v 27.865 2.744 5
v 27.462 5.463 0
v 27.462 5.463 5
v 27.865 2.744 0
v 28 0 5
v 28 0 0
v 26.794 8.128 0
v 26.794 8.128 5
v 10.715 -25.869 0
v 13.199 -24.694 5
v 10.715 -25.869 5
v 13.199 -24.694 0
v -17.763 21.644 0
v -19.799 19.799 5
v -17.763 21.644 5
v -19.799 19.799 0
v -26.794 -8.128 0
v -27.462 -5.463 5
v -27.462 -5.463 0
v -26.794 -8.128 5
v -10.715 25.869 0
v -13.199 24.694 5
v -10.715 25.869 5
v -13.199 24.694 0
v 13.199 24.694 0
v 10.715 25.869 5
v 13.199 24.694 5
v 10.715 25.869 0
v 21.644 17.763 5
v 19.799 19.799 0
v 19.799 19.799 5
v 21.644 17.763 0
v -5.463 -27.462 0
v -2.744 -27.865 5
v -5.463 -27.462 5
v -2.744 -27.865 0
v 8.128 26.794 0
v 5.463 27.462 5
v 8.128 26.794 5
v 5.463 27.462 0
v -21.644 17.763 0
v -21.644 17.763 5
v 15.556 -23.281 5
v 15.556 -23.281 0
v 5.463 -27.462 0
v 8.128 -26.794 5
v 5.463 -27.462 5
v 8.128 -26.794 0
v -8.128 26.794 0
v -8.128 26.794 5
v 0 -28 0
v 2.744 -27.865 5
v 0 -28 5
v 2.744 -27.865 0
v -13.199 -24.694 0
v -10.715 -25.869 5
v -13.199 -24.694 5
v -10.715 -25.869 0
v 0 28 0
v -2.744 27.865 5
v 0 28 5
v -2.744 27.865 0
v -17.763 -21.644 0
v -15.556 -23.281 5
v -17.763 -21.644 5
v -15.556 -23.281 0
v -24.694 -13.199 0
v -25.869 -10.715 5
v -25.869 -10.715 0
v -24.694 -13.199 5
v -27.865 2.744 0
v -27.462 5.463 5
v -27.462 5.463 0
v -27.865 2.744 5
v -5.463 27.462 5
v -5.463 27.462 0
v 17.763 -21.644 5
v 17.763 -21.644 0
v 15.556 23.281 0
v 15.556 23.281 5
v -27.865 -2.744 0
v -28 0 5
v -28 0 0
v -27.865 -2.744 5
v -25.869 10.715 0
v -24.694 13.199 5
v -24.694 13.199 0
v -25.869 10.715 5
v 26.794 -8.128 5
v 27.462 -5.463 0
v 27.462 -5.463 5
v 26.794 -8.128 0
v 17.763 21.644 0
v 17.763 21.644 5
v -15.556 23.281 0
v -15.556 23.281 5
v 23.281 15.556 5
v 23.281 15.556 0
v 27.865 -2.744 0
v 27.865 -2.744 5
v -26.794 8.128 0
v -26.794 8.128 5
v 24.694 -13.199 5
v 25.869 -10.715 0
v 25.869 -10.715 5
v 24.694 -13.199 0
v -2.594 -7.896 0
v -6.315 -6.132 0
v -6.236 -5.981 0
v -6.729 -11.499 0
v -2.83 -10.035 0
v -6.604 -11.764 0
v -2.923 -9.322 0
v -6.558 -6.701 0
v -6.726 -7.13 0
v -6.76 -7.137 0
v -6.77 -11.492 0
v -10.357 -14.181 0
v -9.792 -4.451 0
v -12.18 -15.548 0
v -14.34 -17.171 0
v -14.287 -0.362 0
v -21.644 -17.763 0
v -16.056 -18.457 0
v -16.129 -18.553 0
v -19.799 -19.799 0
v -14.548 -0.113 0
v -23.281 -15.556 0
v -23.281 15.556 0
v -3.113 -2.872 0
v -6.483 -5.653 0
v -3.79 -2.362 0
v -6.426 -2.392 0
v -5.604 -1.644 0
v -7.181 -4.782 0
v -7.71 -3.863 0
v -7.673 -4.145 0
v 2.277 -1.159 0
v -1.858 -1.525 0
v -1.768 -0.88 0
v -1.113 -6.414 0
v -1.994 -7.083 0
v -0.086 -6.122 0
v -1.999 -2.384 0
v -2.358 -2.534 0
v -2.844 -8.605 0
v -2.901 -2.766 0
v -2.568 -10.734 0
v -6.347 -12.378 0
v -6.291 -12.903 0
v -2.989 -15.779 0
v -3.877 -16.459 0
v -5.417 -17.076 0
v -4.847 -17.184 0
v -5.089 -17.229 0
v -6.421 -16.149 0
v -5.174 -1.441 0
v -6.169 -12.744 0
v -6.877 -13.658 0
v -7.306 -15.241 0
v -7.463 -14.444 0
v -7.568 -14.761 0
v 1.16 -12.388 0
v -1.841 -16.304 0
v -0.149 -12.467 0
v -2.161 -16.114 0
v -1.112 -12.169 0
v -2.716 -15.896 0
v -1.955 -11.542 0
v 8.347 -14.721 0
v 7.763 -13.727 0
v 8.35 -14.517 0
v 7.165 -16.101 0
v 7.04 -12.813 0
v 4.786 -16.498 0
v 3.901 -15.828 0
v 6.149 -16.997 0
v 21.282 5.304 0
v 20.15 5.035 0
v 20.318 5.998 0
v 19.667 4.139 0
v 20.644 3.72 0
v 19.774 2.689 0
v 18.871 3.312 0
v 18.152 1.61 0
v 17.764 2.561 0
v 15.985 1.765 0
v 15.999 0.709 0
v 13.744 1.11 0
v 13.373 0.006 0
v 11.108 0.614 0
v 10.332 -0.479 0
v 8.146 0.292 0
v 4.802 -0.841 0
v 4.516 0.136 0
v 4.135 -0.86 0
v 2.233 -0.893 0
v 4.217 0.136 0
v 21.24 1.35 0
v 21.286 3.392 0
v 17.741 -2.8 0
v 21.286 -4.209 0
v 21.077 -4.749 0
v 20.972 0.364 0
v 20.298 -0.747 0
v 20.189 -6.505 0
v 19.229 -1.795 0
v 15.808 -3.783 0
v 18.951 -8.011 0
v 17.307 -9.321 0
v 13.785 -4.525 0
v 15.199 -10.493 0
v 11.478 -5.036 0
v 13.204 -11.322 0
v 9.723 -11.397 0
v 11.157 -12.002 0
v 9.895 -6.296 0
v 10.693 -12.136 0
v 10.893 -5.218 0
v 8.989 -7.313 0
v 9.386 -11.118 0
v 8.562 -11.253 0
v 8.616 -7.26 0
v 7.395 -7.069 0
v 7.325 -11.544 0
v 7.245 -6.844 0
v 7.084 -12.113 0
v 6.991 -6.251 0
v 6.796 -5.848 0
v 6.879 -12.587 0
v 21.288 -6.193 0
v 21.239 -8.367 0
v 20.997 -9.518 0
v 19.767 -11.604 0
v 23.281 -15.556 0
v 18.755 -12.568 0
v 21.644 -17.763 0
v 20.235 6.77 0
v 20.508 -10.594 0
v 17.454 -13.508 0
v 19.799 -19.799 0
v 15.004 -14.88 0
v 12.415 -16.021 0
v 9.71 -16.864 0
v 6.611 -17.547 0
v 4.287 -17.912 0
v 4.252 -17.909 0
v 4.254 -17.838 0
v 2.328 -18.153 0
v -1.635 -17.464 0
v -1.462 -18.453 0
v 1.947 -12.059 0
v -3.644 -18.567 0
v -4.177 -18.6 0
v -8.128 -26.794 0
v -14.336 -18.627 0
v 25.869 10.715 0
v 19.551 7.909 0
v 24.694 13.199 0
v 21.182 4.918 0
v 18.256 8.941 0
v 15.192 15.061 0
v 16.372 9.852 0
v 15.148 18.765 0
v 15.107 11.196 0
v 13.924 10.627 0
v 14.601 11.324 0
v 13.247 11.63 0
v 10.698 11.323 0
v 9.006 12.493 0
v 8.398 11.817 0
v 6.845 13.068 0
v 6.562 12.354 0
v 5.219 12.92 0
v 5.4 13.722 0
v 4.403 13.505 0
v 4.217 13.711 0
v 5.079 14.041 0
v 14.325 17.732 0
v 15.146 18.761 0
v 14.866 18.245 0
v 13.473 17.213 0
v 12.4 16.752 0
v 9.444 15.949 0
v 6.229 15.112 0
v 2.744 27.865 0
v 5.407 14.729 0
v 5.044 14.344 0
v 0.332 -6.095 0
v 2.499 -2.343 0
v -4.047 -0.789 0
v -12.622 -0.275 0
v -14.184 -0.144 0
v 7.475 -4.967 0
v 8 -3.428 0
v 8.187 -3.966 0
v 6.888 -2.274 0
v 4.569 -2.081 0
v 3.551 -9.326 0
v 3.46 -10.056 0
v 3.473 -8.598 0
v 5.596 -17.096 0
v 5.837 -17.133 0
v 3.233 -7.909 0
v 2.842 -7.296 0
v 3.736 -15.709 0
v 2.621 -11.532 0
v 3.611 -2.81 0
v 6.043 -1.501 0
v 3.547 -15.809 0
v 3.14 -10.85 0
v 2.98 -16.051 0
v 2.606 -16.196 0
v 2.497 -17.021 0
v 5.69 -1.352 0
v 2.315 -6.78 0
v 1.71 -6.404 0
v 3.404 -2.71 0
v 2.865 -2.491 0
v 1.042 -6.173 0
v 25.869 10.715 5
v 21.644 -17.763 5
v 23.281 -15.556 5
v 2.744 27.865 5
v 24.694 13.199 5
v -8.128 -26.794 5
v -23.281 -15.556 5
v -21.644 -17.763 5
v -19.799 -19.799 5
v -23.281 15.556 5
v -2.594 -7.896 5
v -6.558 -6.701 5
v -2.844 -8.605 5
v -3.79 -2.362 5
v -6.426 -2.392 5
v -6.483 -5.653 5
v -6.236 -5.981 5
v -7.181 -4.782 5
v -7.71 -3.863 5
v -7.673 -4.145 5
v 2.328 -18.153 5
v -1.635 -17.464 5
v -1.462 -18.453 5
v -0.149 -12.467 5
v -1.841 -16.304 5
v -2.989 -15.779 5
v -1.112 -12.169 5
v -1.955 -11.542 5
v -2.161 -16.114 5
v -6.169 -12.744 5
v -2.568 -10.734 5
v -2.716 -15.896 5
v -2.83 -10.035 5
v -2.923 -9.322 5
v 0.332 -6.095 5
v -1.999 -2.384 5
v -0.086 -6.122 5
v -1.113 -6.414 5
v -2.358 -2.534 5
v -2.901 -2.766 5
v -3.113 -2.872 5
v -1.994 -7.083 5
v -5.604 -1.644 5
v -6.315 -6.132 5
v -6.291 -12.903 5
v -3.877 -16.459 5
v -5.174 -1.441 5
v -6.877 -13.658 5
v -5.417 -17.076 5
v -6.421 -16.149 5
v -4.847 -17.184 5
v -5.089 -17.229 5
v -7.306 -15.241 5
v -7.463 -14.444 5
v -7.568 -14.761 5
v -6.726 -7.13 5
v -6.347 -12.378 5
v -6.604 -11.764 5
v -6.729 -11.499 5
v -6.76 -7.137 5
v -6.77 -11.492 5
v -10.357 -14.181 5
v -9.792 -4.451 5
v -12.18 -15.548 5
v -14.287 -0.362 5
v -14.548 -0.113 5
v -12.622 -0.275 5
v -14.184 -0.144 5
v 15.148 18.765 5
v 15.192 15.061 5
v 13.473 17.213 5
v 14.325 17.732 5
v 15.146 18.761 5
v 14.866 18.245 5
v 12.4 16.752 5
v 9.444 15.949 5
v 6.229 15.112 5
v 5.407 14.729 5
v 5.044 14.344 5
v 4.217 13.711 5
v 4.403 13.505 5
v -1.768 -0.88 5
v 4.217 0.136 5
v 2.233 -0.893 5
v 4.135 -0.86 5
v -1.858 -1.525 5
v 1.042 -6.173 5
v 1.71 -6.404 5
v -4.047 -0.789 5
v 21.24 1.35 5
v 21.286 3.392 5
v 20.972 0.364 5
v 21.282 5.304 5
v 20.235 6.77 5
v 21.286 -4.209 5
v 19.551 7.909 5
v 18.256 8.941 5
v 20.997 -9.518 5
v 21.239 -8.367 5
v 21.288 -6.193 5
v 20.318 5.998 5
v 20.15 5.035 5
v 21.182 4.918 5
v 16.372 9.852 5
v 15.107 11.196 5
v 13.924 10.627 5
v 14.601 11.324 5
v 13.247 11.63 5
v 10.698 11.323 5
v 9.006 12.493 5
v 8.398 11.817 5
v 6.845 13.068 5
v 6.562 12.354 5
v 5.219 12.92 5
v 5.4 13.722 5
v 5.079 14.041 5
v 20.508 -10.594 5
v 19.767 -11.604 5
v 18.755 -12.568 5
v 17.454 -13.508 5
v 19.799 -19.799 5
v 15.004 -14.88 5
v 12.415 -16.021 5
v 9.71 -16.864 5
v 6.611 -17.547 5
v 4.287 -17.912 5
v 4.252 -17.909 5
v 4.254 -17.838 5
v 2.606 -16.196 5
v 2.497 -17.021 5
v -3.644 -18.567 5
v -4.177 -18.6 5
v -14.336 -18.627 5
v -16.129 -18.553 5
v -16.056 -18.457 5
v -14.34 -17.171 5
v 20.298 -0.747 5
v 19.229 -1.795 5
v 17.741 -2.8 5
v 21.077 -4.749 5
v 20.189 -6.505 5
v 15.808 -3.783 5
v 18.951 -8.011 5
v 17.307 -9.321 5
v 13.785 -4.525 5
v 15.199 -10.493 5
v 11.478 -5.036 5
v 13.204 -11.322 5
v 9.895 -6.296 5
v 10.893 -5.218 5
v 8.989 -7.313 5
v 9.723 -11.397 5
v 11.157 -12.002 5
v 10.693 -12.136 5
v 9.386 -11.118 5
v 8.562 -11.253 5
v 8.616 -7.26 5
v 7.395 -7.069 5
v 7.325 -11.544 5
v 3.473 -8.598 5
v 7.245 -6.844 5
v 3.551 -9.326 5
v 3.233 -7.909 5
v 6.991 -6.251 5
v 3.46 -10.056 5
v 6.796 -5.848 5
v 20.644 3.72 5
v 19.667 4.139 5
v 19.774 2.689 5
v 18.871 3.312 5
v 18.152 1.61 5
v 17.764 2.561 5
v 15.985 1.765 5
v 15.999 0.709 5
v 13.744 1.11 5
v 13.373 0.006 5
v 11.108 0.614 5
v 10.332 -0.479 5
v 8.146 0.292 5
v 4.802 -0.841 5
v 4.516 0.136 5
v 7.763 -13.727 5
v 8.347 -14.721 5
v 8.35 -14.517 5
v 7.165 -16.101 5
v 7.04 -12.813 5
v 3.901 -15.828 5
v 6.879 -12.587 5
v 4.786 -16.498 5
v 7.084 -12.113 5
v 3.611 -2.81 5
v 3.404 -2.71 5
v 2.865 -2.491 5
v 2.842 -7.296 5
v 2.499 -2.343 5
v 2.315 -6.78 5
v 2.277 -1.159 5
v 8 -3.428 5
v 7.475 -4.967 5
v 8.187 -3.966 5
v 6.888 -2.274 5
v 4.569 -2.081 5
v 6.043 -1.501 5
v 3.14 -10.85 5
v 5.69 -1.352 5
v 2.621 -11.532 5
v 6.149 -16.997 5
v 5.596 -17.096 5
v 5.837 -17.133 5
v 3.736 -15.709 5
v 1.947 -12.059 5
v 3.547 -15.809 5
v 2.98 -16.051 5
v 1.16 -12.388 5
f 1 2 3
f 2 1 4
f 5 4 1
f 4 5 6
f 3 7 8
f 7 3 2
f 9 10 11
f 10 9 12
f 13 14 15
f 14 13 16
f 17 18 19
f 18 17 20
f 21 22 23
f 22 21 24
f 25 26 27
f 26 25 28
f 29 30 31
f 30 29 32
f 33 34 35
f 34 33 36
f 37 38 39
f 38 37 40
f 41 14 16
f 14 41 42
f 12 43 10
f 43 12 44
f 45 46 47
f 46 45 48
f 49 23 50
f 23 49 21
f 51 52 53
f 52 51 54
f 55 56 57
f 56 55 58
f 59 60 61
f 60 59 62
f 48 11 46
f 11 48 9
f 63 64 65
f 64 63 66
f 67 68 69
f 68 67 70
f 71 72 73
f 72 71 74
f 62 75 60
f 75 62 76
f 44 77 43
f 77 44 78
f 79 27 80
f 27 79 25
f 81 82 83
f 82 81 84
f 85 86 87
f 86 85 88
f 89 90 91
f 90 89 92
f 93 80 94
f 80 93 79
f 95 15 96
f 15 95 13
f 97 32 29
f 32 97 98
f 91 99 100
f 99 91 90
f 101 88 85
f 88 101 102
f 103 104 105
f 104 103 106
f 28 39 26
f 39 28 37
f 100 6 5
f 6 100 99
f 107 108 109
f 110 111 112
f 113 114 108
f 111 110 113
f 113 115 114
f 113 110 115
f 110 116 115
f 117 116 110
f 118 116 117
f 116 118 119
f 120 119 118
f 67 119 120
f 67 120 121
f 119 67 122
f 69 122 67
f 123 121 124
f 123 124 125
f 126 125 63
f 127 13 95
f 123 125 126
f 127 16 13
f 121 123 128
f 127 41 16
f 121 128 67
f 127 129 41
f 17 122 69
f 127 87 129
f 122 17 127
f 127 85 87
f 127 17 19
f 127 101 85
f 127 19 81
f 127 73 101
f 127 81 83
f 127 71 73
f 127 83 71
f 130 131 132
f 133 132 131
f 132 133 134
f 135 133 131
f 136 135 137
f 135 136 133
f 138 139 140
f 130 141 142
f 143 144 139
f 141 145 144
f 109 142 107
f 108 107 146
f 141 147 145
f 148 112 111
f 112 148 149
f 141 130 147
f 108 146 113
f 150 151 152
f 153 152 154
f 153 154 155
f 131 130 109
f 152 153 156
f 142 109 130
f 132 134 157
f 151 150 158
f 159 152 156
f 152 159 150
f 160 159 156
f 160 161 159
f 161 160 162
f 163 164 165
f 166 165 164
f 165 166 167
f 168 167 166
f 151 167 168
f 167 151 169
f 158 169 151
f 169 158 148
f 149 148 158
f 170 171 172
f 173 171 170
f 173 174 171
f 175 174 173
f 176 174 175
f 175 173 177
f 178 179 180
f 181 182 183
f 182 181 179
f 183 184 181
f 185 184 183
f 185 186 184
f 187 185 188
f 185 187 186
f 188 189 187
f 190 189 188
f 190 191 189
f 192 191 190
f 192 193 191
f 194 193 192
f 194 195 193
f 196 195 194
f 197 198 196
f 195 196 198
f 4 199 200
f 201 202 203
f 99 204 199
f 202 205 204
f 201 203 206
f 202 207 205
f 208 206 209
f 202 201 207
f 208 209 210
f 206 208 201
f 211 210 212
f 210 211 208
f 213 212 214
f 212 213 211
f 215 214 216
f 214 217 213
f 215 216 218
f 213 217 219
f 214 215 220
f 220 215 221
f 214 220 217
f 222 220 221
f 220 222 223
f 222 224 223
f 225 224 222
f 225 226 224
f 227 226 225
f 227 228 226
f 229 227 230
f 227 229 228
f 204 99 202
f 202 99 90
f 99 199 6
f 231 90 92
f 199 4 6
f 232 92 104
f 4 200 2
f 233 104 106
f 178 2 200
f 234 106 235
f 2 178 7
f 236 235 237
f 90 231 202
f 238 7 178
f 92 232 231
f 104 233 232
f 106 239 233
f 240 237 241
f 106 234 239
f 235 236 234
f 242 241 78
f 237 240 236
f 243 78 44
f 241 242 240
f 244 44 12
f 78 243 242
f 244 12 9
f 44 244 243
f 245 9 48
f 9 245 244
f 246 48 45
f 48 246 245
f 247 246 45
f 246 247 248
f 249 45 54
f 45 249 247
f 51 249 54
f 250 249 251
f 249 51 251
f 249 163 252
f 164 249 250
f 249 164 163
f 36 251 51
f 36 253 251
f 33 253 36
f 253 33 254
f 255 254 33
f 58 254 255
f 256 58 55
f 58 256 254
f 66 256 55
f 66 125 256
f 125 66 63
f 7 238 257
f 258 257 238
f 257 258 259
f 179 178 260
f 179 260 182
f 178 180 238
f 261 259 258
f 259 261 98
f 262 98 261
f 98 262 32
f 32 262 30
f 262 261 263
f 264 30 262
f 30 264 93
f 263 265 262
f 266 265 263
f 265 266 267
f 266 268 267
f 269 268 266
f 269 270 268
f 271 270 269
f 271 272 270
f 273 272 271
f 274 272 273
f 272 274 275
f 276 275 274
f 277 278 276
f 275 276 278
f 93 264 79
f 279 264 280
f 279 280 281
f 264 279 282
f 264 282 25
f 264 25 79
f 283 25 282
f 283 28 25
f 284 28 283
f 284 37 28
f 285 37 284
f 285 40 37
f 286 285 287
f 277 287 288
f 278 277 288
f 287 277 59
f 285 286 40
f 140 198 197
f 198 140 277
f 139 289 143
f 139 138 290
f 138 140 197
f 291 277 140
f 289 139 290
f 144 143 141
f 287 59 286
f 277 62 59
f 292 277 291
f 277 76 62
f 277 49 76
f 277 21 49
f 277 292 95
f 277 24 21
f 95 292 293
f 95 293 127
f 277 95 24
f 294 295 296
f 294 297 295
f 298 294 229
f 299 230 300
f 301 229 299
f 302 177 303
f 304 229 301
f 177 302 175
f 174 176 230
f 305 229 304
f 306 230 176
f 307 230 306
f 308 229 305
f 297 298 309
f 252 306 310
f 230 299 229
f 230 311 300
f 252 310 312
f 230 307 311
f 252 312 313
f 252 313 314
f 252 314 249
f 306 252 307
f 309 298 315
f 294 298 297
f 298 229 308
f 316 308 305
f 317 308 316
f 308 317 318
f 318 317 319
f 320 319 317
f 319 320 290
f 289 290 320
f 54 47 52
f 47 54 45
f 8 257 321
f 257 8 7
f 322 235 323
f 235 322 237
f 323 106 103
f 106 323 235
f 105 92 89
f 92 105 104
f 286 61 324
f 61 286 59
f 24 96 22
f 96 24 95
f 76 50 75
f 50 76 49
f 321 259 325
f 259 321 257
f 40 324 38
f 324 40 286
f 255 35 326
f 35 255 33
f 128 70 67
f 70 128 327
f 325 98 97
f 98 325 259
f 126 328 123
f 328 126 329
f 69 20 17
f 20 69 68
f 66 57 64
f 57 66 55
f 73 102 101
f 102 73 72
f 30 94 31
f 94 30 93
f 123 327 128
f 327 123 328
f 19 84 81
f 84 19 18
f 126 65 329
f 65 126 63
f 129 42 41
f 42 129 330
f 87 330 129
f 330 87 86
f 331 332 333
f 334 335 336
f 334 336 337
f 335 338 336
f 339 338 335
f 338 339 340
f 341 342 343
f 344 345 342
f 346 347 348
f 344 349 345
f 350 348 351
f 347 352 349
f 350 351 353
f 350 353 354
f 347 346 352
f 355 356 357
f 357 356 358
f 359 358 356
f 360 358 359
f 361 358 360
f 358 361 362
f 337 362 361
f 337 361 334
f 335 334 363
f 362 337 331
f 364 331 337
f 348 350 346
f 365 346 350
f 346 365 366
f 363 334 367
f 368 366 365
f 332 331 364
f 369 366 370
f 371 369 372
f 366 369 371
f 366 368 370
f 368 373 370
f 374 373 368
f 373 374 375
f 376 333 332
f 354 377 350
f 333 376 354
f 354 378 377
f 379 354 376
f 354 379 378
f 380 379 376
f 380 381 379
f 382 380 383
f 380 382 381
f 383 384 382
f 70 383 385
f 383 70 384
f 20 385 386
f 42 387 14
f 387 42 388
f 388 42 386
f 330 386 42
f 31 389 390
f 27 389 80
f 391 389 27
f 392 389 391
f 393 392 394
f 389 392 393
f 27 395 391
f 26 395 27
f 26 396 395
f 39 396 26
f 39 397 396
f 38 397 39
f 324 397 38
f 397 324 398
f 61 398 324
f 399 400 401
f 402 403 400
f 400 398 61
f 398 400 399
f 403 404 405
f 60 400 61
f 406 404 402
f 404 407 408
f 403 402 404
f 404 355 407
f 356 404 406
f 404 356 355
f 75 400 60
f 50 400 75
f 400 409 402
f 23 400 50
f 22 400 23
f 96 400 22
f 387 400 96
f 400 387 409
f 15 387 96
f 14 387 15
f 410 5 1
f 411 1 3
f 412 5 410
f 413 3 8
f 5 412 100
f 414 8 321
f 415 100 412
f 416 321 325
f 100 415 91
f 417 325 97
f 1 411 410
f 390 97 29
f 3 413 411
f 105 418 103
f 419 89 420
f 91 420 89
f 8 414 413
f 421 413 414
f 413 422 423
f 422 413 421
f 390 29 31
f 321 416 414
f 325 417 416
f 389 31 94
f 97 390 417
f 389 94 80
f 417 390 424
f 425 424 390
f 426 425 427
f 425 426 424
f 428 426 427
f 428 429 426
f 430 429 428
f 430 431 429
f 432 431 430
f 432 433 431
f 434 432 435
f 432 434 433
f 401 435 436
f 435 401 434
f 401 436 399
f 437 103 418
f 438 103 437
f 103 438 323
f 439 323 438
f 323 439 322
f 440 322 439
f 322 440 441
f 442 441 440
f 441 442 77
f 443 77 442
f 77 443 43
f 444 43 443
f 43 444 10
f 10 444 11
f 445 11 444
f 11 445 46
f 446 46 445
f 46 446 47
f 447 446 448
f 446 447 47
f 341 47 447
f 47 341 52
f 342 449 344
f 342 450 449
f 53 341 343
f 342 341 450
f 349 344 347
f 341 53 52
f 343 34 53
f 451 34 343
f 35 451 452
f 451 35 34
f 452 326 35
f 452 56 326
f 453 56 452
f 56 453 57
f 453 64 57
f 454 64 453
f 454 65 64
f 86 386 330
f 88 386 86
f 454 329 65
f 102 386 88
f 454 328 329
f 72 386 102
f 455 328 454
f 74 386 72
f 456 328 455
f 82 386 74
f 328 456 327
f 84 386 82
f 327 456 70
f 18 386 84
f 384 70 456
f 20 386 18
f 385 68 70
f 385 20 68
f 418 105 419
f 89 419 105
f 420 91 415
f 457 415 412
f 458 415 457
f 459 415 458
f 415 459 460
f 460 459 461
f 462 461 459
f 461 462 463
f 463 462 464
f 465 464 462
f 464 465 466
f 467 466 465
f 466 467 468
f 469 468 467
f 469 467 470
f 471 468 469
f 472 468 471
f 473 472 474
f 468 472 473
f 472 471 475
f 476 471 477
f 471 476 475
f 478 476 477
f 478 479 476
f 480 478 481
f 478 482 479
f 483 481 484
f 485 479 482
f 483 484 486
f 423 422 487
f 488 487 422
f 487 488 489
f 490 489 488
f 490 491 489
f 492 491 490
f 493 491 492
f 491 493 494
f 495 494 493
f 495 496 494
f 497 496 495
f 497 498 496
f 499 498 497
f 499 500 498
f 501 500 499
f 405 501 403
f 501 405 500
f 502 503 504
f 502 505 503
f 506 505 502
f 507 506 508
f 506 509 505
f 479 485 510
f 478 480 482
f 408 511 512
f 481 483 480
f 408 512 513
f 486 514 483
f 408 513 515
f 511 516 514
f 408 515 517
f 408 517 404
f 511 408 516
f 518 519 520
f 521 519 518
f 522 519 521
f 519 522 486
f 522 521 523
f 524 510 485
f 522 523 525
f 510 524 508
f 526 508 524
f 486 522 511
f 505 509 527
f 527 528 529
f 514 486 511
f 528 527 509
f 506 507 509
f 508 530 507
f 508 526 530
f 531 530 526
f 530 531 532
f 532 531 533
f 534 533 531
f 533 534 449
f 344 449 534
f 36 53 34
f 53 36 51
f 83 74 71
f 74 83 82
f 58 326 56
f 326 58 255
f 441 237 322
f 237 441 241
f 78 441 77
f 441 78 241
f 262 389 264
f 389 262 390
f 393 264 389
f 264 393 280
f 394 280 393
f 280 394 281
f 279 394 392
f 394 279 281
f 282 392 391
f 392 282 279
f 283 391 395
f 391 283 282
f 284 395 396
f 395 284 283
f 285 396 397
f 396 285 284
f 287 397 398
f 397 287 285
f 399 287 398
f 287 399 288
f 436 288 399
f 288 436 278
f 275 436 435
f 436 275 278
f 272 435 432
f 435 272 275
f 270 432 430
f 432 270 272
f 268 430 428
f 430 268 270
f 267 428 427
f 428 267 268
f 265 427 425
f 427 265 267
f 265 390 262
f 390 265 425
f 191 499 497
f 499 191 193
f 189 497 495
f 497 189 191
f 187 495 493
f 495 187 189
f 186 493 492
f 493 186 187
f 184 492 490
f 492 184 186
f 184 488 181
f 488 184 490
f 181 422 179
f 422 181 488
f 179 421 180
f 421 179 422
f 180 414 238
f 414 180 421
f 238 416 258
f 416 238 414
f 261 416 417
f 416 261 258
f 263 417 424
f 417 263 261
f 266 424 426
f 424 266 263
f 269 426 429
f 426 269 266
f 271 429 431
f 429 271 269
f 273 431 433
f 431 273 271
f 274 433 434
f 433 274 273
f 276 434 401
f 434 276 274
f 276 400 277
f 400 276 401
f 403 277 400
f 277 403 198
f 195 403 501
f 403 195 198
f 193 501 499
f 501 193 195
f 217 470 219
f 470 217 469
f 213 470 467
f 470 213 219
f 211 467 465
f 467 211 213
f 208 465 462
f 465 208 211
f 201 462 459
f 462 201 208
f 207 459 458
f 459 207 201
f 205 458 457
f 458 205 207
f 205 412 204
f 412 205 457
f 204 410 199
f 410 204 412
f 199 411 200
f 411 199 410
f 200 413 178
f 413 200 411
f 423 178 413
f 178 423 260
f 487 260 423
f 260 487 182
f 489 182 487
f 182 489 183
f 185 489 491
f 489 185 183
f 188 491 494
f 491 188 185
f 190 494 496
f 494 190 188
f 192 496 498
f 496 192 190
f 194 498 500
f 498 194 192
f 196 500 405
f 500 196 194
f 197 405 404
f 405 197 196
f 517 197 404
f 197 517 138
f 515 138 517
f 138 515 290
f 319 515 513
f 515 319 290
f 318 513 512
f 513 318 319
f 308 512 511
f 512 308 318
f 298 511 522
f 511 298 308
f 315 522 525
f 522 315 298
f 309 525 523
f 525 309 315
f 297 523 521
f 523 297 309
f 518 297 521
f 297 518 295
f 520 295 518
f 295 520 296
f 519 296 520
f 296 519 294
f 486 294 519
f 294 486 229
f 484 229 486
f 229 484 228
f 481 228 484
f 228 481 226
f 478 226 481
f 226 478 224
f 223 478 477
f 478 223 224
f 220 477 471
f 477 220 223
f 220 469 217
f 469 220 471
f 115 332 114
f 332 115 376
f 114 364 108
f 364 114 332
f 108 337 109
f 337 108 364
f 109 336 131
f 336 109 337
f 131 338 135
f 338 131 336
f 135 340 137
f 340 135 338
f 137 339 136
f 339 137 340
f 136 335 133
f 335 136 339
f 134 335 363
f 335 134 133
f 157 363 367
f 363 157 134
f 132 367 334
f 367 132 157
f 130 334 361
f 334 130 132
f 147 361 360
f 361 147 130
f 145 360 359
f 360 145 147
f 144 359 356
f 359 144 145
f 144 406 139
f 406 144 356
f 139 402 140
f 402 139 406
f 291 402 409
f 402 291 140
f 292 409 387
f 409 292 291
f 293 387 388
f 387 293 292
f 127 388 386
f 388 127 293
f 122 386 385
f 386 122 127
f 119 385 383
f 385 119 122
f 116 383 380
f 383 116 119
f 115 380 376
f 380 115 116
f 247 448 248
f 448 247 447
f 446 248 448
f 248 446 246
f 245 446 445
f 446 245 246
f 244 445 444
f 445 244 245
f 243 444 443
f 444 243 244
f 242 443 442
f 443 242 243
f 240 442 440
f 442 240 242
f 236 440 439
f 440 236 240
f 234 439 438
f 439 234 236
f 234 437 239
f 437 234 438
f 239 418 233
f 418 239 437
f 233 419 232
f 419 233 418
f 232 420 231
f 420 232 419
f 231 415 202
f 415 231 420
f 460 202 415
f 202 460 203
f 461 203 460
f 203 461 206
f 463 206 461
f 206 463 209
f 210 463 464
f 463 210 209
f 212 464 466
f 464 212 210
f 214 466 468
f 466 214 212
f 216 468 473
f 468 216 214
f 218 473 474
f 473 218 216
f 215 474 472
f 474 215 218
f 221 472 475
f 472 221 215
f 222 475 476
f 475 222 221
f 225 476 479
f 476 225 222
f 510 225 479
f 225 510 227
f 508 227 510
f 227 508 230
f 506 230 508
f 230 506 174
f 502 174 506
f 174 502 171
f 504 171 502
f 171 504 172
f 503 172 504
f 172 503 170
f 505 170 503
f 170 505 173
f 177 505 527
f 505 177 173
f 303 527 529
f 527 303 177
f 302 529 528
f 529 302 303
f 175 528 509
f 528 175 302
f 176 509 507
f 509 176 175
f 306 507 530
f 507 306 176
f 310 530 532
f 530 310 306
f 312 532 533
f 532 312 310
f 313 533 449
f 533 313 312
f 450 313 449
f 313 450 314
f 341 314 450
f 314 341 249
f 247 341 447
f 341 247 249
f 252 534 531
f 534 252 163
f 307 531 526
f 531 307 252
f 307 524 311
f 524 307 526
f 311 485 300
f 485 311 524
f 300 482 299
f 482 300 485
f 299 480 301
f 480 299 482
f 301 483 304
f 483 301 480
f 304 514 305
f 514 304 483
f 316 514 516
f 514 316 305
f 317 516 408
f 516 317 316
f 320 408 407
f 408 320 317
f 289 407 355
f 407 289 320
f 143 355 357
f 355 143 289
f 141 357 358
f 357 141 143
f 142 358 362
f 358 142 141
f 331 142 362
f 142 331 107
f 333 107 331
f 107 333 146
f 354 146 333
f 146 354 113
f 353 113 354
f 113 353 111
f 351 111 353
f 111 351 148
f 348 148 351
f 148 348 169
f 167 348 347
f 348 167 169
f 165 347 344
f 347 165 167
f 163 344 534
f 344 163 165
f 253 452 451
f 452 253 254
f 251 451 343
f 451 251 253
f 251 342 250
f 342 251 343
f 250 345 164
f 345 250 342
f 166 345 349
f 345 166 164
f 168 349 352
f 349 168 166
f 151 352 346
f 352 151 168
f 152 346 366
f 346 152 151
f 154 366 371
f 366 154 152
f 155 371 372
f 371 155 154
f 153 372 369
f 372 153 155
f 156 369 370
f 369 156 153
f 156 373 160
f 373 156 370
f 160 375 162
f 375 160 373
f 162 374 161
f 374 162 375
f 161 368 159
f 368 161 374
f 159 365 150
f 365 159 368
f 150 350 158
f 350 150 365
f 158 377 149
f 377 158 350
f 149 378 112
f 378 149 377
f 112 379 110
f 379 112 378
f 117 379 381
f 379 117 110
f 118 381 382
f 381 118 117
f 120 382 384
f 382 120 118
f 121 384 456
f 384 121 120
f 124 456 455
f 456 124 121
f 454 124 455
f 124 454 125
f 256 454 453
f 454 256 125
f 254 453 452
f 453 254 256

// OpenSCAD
$fn=64;

difference(){
    cylinder(r=28, h=5);
    translate([-20, 0, 0]) linear_extrude(height=5)
        import(file = "bhacklogo.dxf");
}
